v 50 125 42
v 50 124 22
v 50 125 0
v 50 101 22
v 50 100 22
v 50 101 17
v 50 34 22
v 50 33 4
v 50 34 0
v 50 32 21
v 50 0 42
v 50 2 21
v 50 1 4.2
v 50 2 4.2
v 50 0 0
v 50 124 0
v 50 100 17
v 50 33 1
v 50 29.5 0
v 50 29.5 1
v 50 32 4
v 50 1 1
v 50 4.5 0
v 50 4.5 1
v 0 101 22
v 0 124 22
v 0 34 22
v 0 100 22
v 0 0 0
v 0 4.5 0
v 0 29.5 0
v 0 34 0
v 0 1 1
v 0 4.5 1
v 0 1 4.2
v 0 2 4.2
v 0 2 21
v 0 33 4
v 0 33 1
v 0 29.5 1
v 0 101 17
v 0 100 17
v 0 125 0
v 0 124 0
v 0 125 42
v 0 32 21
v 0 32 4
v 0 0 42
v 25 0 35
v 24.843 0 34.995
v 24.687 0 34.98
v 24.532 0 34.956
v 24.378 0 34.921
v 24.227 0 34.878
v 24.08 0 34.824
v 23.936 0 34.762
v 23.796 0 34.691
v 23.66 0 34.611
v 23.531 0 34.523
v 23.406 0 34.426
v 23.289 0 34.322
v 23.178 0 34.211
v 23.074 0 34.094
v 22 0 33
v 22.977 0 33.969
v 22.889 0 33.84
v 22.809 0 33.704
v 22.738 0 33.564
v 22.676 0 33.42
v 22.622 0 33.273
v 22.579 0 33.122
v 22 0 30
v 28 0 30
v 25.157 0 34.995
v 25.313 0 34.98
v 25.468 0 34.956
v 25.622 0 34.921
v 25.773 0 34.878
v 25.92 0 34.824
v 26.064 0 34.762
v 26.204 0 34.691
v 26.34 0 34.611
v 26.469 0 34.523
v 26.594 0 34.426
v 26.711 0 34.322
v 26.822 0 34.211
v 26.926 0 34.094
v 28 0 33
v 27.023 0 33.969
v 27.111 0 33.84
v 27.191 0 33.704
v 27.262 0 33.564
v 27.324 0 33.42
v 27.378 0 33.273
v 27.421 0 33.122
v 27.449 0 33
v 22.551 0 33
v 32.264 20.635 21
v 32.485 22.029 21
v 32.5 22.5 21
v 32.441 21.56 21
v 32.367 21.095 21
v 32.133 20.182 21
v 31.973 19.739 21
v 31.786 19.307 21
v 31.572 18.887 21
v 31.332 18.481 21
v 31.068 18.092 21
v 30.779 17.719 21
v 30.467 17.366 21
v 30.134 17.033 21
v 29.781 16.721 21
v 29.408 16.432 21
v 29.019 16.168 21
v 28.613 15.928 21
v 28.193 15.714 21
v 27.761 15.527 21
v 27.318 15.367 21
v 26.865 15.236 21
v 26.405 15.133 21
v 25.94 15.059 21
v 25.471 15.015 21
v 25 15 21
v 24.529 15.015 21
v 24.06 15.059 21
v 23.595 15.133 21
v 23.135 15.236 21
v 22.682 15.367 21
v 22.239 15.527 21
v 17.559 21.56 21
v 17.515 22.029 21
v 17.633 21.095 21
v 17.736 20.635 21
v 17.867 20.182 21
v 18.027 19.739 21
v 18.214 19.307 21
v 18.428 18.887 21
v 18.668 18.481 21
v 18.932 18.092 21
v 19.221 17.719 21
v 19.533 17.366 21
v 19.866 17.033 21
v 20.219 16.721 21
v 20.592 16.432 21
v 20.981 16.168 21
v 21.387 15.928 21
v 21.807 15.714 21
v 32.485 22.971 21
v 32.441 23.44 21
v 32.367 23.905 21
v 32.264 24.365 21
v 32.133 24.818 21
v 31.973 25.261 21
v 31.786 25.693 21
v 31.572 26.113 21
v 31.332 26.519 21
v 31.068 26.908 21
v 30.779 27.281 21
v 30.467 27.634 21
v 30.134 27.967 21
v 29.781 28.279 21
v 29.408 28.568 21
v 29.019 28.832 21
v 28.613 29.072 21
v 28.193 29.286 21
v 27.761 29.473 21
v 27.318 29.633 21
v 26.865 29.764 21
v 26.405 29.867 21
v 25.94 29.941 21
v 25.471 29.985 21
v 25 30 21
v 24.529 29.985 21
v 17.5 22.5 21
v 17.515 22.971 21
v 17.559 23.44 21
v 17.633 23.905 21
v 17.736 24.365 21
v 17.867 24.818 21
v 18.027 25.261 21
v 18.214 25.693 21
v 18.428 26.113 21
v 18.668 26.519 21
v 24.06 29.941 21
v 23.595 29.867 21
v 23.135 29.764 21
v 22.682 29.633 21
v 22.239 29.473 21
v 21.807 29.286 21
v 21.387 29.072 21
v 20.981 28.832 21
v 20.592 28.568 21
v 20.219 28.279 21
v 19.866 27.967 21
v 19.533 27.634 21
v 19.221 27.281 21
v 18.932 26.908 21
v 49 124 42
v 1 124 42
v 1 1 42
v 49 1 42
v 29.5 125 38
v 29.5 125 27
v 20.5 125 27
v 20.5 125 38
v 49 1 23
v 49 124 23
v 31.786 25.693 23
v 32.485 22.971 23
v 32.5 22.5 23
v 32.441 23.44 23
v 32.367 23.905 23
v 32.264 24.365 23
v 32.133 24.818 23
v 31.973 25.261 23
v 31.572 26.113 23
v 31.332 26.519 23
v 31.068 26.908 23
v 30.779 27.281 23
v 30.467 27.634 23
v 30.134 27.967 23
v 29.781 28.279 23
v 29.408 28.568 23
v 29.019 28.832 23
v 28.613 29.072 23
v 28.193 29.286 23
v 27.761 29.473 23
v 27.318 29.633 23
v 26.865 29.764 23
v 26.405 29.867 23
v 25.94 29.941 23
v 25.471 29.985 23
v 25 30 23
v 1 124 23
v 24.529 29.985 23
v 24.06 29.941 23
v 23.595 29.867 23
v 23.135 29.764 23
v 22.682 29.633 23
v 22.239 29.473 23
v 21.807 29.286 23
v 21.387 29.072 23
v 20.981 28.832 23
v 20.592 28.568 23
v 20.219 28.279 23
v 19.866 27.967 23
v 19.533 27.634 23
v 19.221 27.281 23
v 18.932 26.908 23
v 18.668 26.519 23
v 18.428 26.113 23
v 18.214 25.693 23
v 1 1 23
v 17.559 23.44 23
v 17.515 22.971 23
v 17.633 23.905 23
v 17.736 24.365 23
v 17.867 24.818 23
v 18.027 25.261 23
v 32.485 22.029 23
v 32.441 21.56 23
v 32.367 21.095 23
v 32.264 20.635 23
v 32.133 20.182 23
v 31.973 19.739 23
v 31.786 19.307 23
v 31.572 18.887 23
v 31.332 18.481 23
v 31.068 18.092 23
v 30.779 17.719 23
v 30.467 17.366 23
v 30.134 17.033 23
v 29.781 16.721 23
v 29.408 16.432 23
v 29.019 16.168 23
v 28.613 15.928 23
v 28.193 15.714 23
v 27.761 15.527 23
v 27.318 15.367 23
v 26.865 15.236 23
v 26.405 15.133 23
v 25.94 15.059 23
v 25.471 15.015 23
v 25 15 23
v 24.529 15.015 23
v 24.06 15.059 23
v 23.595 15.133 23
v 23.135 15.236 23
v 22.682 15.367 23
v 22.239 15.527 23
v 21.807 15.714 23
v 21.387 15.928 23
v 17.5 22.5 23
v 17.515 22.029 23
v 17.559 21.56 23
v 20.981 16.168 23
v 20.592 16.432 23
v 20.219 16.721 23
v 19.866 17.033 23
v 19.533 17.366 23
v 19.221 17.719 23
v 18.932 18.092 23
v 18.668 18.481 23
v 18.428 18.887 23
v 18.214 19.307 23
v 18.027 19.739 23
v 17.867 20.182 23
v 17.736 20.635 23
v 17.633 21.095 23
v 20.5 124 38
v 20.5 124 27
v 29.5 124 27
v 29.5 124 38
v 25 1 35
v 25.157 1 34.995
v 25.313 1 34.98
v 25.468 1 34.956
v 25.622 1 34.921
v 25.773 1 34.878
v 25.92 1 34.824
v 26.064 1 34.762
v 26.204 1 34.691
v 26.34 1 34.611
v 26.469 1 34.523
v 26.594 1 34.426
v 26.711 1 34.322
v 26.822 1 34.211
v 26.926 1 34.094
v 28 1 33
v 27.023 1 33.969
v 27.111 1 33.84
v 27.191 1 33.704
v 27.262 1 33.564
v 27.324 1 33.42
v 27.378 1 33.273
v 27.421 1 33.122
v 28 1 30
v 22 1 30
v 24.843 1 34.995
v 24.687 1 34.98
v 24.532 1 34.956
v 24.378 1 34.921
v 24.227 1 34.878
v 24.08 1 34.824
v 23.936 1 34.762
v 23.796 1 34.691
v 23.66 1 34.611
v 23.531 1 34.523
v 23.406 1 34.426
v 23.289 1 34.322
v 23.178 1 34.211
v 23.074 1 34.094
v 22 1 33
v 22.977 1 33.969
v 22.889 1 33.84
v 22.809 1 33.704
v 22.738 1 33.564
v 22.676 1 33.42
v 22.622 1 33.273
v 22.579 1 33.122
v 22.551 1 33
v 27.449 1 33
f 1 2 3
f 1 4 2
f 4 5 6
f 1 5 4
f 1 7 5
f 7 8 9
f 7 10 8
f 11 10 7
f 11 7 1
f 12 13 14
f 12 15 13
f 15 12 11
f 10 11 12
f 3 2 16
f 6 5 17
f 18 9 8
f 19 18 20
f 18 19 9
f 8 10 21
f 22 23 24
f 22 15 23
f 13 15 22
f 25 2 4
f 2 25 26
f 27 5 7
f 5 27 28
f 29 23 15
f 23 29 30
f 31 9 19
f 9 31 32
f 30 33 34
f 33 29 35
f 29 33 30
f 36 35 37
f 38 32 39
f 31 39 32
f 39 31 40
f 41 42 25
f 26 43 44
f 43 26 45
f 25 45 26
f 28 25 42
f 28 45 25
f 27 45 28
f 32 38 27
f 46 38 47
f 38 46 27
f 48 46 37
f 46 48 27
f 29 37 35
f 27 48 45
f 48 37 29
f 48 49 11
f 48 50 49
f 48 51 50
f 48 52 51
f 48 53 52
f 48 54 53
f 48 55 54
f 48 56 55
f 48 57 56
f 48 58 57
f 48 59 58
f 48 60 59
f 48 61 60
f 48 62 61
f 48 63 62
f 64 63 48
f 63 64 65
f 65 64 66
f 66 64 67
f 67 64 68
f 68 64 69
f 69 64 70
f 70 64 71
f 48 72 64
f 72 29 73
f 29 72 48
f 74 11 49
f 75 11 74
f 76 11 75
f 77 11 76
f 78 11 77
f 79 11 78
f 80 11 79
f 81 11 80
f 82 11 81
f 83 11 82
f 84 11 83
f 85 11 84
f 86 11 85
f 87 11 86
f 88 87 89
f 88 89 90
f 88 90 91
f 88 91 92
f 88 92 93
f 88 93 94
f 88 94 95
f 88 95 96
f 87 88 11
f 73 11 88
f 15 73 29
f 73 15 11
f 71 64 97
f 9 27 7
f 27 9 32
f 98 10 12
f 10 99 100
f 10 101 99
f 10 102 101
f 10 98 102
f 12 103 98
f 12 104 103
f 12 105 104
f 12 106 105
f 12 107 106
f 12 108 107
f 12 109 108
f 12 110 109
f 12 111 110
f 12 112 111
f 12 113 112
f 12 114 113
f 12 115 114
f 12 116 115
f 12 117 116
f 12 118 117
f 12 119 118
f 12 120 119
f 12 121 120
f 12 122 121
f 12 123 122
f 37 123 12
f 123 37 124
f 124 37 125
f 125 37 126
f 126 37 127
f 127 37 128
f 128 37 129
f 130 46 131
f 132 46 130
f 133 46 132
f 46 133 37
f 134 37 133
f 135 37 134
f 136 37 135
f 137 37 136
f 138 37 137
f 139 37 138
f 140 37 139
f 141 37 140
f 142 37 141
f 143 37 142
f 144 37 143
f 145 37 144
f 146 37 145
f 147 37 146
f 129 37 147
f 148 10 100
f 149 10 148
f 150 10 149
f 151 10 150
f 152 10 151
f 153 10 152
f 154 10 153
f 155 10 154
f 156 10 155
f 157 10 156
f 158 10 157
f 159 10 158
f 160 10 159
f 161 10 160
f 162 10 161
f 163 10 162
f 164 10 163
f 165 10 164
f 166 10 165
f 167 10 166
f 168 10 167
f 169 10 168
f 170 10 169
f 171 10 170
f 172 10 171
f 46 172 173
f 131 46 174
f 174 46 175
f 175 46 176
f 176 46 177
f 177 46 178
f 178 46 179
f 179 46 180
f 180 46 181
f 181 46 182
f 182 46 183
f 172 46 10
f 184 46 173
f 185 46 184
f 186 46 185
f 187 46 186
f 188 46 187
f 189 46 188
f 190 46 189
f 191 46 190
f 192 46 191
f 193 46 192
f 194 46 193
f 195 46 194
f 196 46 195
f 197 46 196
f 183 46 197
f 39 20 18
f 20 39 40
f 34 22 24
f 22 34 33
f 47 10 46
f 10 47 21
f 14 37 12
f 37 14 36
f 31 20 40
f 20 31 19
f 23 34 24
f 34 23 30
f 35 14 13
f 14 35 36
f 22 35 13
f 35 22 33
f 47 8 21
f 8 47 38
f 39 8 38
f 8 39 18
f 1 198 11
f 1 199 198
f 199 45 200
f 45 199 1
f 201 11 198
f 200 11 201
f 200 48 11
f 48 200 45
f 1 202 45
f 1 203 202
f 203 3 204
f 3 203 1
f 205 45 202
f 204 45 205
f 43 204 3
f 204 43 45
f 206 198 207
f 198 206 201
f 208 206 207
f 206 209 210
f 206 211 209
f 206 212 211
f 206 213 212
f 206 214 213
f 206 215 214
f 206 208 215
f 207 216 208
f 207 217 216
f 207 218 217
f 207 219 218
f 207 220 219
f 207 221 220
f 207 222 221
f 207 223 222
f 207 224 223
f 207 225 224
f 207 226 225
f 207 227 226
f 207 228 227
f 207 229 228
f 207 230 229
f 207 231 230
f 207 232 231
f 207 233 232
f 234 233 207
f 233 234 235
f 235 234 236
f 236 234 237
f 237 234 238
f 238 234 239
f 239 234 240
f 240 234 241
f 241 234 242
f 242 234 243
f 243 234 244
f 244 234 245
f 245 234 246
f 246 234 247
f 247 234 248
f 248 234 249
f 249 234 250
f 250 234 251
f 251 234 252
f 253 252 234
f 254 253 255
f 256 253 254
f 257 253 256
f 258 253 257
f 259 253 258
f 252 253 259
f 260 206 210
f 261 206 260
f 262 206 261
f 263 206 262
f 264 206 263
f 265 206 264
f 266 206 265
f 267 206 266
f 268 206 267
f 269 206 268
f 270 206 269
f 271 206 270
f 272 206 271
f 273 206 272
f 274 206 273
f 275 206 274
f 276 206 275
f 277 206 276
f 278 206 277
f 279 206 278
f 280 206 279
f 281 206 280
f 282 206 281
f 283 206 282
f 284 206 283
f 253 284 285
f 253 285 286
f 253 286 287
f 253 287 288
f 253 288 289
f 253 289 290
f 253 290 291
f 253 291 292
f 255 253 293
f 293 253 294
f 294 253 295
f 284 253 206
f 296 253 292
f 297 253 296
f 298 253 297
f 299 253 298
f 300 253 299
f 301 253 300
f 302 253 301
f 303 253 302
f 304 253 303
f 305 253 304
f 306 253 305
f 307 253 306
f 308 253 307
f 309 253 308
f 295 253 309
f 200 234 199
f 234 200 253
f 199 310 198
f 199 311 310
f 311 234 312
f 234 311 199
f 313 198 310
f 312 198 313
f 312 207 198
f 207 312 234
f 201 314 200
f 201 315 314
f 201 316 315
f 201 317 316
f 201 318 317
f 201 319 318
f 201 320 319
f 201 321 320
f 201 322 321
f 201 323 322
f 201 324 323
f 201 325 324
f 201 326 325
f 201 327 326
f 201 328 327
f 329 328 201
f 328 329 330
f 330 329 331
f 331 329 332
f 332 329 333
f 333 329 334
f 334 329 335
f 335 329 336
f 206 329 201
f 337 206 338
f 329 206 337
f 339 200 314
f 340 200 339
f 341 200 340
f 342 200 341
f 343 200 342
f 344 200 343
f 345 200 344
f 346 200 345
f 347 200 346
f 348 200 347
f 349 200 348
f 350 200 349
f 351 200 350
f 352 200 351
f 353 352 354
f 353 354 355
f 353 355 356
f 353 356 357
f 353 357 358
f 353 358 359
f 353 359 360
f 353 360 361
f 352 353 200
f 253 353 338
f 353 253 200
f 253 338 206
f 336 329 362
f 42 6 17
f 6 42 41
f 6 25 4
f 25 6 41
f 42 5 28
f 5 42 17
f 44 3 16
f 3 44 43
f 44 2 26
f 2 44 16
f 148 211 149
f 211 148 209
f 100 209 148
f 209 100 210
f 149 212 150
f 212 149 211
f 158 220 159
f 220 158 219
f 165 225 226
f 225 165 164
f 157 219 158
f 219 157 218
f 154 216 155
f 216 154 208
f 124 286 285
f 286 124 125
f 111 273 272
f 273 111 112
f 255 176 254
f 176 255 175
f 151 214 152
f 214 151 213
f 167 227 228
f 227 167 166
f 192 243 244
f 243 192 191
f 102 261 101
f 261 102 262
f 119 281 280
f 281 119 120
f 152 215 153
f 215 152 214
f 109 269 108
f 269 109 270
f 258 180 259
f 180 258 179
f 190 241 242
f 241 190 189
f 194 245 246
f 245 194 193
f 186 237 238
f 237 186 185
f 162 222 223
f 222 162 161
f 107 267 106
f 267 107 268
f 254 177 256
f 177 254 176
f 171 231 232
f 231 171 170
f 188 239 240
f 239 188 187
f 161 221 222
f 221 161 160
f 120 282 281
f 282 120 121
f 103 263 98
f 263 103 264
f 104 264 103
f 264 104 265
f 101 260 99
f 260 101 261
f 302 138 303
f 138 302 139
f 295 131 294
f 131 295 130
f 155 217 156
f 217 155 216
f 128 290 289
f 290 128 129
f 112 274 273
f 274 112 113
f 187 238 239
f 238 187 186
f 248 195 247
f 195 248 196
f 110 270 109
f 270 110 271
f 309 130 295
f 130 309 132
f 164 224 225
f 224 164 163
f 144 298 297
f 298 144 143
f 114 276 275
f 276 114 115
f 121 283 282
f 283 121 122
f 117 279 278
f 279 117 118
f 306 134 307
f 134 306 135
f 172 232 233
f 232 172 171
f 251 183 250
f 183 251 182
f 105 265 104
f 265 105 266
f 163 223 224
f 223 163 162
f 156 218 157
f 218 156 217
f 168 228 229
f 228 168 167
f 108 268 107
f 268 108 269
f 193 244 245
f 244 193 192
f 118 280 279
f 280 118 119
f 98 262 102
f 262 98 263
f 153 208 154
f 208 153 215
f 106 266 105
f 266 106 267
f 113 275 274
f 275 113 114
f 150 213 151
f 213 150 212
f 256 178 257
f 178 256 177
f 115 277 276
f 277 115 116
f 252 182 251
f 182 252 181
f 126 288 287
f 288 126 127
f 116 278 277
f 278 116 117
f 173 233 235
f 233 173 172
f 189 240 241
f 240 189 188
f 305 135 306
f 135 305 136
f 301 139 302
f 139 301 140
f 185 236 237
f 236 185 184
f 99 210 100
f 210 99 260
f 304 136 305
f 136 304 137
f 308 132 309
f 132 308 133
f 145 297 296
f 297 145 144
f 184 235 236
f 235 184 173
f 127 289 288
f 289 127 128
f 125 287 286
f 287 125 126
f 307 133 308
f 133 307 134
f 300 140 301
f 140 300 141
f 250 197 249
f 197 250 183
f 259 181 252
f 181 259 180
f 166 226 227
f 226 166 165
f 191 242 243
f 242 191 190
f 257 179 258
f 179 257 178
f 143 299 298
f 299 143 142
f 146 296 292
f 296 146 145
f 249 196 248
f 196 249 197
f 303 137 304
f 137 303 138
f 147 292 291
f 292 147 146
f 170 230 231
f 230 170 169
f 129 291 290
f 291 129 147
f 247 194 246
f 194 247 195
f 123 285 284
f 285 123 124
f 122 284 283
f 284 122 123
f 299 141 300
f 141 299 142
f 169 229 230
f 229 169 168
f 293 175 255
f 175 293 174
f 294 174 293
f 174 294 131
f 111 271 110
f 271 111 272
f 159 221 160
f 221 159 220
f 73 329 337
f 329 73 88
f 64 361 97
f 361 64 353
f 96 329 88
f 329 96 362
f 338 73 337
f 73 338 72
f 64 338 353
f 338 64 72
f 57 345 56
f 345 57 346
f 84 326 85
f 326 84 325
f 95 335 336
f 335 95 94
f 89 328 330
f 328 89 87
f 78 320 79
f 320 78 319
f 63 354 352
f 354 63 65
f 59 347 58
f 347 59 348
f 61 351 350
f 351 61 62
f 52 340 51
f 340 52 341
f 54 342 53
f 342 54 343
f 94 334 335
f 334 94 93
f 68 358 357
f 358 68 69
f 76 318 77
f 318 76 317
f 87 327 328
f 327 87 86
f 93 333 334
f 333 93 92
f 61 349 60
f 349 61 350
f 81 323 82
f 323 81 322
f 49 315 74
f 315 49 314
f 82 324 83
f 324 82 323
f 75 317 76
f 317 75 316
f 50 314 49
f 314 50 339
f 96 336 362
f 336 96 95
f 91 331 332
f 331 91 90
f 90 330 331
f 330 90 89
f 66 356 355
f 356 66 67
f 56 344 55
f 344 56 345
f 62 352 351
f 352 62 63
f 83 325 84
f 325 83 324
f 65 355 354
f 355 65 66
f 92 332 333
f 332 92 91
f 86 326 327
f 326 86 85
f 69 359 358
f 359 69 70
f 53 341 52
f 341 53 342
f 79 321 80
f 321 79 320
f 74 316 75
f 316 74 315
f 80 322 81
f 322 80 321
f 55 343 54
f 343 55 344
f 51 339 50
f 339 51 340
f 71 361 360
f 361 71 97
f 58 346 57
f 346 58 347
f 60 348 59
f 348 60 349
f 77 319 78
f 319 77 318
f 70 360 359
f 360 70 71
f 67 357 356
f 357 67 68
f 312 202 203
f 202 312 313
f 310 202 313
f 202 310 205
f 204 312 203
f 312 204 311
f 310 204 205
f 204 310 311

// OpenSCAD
$fn=100;


ml_up_width=600;
ml_up_depth=30;
ml_up_heigth=20;
ml_up_thickness=2;

ml_h_width=50;
ml_h_height=20;
ml_h_monitor_thickness=25;
ml_h_monitor_distance=70;
ml_h_thickness=1;

module lamp_clip(w, d, h, t) {
    difference() {

        union() {
            // Outer shape
            translate([0, 1, 0])
            cube([w, d + t * 2, h + t * 2]);

            // Static reinforcement of 1mm
            translate([0, 0, 0])
            cube([w, 1, h + t * 2]);

            // Static reinforcement of 1mm
            translate([0, d + t * 2 + 1, 0])
            cube([w, 1, h + t * 2]);
        }

        // cutout
        translate([-1, t + 1, t])
        cube([w + 2, d, h]);

        //Cut out the lower part of the clip
        color("red")
        translate([-1, t + 3.5, -1])
        cube([w + 2, d - t - 4, t + 2]);

        //Cut out diffusor (3mm)
        color("red")
        translate([-1, 1, t])
        cube([w + 2, t + 1, 3.2]);

        //Cut out diffusor (3mm)
        color("red")
        translate([-1, d +  t, t])
        cube([w + 2, t + 1, 3]);

    }

}

module lamp_box(w, d, h, t) {

    difference() {
        cube([w, d, h]);

        translate([t, t, t])
        cube([w - t * 2, d - t * 2, h]);
    }
}

difference() {
    union() {
        lamp_clip(ml_h_width,
                ml_up_depth,
                ml_up_heigth,
                ml_h_thickness);


        translate([0, 0, ml_up_heigth + ml_up_thickness])
        lamp_box(ml_h_width,
                ml_up_depth + ml_h_monitor_thickness + ml_h_monitor_distance,
                ml_h_height,
                ml_h_thickness);

        translate([0, ml_up_depth + ml_h_monitor_distance, ml_h_height -3])
        cube([ml_h_width, ml_h_thickness, 5]);

        translate([0, ml_up_depth + ml_h_monitor_distance + ml_h_monitor_thickness - ml_h_thickness, 0])
        cube([ml_h_width, ml_h_thickness, ml_h_height + ml_h_thickness + 1]);
    }

    // The hole between clip and case
    color("red")
    translate([ml_h_width/2, ml_up_depth - 7.5, ml_up_heigth])
    cylinder(h=4, r=7.5);

    // The hole for the infrared diode
    color("red")
    translate([ml_h_width / 2 -3, -1, ml_up_heigth + ml_h_height / 2])
    cube([6, 3, 3]);

    color("red")
    translate([ml_h_width / 2, + 3, 2.5 + ml_up_heigth + ml_h_height / 2])
    rotate([90,0,0])
    cylinder(h=4, r=2.5);

    //The hole for the power connector
    color("red")
    translate([ml_h_width / 2 - 4.5, ml_up_depth + ml_h_monitor_distance + ml_h_monitor_thickness - 2, ml_up_heigth + ml_h_thickness + 6])
    cube([9, 3, 11]);
}
        
